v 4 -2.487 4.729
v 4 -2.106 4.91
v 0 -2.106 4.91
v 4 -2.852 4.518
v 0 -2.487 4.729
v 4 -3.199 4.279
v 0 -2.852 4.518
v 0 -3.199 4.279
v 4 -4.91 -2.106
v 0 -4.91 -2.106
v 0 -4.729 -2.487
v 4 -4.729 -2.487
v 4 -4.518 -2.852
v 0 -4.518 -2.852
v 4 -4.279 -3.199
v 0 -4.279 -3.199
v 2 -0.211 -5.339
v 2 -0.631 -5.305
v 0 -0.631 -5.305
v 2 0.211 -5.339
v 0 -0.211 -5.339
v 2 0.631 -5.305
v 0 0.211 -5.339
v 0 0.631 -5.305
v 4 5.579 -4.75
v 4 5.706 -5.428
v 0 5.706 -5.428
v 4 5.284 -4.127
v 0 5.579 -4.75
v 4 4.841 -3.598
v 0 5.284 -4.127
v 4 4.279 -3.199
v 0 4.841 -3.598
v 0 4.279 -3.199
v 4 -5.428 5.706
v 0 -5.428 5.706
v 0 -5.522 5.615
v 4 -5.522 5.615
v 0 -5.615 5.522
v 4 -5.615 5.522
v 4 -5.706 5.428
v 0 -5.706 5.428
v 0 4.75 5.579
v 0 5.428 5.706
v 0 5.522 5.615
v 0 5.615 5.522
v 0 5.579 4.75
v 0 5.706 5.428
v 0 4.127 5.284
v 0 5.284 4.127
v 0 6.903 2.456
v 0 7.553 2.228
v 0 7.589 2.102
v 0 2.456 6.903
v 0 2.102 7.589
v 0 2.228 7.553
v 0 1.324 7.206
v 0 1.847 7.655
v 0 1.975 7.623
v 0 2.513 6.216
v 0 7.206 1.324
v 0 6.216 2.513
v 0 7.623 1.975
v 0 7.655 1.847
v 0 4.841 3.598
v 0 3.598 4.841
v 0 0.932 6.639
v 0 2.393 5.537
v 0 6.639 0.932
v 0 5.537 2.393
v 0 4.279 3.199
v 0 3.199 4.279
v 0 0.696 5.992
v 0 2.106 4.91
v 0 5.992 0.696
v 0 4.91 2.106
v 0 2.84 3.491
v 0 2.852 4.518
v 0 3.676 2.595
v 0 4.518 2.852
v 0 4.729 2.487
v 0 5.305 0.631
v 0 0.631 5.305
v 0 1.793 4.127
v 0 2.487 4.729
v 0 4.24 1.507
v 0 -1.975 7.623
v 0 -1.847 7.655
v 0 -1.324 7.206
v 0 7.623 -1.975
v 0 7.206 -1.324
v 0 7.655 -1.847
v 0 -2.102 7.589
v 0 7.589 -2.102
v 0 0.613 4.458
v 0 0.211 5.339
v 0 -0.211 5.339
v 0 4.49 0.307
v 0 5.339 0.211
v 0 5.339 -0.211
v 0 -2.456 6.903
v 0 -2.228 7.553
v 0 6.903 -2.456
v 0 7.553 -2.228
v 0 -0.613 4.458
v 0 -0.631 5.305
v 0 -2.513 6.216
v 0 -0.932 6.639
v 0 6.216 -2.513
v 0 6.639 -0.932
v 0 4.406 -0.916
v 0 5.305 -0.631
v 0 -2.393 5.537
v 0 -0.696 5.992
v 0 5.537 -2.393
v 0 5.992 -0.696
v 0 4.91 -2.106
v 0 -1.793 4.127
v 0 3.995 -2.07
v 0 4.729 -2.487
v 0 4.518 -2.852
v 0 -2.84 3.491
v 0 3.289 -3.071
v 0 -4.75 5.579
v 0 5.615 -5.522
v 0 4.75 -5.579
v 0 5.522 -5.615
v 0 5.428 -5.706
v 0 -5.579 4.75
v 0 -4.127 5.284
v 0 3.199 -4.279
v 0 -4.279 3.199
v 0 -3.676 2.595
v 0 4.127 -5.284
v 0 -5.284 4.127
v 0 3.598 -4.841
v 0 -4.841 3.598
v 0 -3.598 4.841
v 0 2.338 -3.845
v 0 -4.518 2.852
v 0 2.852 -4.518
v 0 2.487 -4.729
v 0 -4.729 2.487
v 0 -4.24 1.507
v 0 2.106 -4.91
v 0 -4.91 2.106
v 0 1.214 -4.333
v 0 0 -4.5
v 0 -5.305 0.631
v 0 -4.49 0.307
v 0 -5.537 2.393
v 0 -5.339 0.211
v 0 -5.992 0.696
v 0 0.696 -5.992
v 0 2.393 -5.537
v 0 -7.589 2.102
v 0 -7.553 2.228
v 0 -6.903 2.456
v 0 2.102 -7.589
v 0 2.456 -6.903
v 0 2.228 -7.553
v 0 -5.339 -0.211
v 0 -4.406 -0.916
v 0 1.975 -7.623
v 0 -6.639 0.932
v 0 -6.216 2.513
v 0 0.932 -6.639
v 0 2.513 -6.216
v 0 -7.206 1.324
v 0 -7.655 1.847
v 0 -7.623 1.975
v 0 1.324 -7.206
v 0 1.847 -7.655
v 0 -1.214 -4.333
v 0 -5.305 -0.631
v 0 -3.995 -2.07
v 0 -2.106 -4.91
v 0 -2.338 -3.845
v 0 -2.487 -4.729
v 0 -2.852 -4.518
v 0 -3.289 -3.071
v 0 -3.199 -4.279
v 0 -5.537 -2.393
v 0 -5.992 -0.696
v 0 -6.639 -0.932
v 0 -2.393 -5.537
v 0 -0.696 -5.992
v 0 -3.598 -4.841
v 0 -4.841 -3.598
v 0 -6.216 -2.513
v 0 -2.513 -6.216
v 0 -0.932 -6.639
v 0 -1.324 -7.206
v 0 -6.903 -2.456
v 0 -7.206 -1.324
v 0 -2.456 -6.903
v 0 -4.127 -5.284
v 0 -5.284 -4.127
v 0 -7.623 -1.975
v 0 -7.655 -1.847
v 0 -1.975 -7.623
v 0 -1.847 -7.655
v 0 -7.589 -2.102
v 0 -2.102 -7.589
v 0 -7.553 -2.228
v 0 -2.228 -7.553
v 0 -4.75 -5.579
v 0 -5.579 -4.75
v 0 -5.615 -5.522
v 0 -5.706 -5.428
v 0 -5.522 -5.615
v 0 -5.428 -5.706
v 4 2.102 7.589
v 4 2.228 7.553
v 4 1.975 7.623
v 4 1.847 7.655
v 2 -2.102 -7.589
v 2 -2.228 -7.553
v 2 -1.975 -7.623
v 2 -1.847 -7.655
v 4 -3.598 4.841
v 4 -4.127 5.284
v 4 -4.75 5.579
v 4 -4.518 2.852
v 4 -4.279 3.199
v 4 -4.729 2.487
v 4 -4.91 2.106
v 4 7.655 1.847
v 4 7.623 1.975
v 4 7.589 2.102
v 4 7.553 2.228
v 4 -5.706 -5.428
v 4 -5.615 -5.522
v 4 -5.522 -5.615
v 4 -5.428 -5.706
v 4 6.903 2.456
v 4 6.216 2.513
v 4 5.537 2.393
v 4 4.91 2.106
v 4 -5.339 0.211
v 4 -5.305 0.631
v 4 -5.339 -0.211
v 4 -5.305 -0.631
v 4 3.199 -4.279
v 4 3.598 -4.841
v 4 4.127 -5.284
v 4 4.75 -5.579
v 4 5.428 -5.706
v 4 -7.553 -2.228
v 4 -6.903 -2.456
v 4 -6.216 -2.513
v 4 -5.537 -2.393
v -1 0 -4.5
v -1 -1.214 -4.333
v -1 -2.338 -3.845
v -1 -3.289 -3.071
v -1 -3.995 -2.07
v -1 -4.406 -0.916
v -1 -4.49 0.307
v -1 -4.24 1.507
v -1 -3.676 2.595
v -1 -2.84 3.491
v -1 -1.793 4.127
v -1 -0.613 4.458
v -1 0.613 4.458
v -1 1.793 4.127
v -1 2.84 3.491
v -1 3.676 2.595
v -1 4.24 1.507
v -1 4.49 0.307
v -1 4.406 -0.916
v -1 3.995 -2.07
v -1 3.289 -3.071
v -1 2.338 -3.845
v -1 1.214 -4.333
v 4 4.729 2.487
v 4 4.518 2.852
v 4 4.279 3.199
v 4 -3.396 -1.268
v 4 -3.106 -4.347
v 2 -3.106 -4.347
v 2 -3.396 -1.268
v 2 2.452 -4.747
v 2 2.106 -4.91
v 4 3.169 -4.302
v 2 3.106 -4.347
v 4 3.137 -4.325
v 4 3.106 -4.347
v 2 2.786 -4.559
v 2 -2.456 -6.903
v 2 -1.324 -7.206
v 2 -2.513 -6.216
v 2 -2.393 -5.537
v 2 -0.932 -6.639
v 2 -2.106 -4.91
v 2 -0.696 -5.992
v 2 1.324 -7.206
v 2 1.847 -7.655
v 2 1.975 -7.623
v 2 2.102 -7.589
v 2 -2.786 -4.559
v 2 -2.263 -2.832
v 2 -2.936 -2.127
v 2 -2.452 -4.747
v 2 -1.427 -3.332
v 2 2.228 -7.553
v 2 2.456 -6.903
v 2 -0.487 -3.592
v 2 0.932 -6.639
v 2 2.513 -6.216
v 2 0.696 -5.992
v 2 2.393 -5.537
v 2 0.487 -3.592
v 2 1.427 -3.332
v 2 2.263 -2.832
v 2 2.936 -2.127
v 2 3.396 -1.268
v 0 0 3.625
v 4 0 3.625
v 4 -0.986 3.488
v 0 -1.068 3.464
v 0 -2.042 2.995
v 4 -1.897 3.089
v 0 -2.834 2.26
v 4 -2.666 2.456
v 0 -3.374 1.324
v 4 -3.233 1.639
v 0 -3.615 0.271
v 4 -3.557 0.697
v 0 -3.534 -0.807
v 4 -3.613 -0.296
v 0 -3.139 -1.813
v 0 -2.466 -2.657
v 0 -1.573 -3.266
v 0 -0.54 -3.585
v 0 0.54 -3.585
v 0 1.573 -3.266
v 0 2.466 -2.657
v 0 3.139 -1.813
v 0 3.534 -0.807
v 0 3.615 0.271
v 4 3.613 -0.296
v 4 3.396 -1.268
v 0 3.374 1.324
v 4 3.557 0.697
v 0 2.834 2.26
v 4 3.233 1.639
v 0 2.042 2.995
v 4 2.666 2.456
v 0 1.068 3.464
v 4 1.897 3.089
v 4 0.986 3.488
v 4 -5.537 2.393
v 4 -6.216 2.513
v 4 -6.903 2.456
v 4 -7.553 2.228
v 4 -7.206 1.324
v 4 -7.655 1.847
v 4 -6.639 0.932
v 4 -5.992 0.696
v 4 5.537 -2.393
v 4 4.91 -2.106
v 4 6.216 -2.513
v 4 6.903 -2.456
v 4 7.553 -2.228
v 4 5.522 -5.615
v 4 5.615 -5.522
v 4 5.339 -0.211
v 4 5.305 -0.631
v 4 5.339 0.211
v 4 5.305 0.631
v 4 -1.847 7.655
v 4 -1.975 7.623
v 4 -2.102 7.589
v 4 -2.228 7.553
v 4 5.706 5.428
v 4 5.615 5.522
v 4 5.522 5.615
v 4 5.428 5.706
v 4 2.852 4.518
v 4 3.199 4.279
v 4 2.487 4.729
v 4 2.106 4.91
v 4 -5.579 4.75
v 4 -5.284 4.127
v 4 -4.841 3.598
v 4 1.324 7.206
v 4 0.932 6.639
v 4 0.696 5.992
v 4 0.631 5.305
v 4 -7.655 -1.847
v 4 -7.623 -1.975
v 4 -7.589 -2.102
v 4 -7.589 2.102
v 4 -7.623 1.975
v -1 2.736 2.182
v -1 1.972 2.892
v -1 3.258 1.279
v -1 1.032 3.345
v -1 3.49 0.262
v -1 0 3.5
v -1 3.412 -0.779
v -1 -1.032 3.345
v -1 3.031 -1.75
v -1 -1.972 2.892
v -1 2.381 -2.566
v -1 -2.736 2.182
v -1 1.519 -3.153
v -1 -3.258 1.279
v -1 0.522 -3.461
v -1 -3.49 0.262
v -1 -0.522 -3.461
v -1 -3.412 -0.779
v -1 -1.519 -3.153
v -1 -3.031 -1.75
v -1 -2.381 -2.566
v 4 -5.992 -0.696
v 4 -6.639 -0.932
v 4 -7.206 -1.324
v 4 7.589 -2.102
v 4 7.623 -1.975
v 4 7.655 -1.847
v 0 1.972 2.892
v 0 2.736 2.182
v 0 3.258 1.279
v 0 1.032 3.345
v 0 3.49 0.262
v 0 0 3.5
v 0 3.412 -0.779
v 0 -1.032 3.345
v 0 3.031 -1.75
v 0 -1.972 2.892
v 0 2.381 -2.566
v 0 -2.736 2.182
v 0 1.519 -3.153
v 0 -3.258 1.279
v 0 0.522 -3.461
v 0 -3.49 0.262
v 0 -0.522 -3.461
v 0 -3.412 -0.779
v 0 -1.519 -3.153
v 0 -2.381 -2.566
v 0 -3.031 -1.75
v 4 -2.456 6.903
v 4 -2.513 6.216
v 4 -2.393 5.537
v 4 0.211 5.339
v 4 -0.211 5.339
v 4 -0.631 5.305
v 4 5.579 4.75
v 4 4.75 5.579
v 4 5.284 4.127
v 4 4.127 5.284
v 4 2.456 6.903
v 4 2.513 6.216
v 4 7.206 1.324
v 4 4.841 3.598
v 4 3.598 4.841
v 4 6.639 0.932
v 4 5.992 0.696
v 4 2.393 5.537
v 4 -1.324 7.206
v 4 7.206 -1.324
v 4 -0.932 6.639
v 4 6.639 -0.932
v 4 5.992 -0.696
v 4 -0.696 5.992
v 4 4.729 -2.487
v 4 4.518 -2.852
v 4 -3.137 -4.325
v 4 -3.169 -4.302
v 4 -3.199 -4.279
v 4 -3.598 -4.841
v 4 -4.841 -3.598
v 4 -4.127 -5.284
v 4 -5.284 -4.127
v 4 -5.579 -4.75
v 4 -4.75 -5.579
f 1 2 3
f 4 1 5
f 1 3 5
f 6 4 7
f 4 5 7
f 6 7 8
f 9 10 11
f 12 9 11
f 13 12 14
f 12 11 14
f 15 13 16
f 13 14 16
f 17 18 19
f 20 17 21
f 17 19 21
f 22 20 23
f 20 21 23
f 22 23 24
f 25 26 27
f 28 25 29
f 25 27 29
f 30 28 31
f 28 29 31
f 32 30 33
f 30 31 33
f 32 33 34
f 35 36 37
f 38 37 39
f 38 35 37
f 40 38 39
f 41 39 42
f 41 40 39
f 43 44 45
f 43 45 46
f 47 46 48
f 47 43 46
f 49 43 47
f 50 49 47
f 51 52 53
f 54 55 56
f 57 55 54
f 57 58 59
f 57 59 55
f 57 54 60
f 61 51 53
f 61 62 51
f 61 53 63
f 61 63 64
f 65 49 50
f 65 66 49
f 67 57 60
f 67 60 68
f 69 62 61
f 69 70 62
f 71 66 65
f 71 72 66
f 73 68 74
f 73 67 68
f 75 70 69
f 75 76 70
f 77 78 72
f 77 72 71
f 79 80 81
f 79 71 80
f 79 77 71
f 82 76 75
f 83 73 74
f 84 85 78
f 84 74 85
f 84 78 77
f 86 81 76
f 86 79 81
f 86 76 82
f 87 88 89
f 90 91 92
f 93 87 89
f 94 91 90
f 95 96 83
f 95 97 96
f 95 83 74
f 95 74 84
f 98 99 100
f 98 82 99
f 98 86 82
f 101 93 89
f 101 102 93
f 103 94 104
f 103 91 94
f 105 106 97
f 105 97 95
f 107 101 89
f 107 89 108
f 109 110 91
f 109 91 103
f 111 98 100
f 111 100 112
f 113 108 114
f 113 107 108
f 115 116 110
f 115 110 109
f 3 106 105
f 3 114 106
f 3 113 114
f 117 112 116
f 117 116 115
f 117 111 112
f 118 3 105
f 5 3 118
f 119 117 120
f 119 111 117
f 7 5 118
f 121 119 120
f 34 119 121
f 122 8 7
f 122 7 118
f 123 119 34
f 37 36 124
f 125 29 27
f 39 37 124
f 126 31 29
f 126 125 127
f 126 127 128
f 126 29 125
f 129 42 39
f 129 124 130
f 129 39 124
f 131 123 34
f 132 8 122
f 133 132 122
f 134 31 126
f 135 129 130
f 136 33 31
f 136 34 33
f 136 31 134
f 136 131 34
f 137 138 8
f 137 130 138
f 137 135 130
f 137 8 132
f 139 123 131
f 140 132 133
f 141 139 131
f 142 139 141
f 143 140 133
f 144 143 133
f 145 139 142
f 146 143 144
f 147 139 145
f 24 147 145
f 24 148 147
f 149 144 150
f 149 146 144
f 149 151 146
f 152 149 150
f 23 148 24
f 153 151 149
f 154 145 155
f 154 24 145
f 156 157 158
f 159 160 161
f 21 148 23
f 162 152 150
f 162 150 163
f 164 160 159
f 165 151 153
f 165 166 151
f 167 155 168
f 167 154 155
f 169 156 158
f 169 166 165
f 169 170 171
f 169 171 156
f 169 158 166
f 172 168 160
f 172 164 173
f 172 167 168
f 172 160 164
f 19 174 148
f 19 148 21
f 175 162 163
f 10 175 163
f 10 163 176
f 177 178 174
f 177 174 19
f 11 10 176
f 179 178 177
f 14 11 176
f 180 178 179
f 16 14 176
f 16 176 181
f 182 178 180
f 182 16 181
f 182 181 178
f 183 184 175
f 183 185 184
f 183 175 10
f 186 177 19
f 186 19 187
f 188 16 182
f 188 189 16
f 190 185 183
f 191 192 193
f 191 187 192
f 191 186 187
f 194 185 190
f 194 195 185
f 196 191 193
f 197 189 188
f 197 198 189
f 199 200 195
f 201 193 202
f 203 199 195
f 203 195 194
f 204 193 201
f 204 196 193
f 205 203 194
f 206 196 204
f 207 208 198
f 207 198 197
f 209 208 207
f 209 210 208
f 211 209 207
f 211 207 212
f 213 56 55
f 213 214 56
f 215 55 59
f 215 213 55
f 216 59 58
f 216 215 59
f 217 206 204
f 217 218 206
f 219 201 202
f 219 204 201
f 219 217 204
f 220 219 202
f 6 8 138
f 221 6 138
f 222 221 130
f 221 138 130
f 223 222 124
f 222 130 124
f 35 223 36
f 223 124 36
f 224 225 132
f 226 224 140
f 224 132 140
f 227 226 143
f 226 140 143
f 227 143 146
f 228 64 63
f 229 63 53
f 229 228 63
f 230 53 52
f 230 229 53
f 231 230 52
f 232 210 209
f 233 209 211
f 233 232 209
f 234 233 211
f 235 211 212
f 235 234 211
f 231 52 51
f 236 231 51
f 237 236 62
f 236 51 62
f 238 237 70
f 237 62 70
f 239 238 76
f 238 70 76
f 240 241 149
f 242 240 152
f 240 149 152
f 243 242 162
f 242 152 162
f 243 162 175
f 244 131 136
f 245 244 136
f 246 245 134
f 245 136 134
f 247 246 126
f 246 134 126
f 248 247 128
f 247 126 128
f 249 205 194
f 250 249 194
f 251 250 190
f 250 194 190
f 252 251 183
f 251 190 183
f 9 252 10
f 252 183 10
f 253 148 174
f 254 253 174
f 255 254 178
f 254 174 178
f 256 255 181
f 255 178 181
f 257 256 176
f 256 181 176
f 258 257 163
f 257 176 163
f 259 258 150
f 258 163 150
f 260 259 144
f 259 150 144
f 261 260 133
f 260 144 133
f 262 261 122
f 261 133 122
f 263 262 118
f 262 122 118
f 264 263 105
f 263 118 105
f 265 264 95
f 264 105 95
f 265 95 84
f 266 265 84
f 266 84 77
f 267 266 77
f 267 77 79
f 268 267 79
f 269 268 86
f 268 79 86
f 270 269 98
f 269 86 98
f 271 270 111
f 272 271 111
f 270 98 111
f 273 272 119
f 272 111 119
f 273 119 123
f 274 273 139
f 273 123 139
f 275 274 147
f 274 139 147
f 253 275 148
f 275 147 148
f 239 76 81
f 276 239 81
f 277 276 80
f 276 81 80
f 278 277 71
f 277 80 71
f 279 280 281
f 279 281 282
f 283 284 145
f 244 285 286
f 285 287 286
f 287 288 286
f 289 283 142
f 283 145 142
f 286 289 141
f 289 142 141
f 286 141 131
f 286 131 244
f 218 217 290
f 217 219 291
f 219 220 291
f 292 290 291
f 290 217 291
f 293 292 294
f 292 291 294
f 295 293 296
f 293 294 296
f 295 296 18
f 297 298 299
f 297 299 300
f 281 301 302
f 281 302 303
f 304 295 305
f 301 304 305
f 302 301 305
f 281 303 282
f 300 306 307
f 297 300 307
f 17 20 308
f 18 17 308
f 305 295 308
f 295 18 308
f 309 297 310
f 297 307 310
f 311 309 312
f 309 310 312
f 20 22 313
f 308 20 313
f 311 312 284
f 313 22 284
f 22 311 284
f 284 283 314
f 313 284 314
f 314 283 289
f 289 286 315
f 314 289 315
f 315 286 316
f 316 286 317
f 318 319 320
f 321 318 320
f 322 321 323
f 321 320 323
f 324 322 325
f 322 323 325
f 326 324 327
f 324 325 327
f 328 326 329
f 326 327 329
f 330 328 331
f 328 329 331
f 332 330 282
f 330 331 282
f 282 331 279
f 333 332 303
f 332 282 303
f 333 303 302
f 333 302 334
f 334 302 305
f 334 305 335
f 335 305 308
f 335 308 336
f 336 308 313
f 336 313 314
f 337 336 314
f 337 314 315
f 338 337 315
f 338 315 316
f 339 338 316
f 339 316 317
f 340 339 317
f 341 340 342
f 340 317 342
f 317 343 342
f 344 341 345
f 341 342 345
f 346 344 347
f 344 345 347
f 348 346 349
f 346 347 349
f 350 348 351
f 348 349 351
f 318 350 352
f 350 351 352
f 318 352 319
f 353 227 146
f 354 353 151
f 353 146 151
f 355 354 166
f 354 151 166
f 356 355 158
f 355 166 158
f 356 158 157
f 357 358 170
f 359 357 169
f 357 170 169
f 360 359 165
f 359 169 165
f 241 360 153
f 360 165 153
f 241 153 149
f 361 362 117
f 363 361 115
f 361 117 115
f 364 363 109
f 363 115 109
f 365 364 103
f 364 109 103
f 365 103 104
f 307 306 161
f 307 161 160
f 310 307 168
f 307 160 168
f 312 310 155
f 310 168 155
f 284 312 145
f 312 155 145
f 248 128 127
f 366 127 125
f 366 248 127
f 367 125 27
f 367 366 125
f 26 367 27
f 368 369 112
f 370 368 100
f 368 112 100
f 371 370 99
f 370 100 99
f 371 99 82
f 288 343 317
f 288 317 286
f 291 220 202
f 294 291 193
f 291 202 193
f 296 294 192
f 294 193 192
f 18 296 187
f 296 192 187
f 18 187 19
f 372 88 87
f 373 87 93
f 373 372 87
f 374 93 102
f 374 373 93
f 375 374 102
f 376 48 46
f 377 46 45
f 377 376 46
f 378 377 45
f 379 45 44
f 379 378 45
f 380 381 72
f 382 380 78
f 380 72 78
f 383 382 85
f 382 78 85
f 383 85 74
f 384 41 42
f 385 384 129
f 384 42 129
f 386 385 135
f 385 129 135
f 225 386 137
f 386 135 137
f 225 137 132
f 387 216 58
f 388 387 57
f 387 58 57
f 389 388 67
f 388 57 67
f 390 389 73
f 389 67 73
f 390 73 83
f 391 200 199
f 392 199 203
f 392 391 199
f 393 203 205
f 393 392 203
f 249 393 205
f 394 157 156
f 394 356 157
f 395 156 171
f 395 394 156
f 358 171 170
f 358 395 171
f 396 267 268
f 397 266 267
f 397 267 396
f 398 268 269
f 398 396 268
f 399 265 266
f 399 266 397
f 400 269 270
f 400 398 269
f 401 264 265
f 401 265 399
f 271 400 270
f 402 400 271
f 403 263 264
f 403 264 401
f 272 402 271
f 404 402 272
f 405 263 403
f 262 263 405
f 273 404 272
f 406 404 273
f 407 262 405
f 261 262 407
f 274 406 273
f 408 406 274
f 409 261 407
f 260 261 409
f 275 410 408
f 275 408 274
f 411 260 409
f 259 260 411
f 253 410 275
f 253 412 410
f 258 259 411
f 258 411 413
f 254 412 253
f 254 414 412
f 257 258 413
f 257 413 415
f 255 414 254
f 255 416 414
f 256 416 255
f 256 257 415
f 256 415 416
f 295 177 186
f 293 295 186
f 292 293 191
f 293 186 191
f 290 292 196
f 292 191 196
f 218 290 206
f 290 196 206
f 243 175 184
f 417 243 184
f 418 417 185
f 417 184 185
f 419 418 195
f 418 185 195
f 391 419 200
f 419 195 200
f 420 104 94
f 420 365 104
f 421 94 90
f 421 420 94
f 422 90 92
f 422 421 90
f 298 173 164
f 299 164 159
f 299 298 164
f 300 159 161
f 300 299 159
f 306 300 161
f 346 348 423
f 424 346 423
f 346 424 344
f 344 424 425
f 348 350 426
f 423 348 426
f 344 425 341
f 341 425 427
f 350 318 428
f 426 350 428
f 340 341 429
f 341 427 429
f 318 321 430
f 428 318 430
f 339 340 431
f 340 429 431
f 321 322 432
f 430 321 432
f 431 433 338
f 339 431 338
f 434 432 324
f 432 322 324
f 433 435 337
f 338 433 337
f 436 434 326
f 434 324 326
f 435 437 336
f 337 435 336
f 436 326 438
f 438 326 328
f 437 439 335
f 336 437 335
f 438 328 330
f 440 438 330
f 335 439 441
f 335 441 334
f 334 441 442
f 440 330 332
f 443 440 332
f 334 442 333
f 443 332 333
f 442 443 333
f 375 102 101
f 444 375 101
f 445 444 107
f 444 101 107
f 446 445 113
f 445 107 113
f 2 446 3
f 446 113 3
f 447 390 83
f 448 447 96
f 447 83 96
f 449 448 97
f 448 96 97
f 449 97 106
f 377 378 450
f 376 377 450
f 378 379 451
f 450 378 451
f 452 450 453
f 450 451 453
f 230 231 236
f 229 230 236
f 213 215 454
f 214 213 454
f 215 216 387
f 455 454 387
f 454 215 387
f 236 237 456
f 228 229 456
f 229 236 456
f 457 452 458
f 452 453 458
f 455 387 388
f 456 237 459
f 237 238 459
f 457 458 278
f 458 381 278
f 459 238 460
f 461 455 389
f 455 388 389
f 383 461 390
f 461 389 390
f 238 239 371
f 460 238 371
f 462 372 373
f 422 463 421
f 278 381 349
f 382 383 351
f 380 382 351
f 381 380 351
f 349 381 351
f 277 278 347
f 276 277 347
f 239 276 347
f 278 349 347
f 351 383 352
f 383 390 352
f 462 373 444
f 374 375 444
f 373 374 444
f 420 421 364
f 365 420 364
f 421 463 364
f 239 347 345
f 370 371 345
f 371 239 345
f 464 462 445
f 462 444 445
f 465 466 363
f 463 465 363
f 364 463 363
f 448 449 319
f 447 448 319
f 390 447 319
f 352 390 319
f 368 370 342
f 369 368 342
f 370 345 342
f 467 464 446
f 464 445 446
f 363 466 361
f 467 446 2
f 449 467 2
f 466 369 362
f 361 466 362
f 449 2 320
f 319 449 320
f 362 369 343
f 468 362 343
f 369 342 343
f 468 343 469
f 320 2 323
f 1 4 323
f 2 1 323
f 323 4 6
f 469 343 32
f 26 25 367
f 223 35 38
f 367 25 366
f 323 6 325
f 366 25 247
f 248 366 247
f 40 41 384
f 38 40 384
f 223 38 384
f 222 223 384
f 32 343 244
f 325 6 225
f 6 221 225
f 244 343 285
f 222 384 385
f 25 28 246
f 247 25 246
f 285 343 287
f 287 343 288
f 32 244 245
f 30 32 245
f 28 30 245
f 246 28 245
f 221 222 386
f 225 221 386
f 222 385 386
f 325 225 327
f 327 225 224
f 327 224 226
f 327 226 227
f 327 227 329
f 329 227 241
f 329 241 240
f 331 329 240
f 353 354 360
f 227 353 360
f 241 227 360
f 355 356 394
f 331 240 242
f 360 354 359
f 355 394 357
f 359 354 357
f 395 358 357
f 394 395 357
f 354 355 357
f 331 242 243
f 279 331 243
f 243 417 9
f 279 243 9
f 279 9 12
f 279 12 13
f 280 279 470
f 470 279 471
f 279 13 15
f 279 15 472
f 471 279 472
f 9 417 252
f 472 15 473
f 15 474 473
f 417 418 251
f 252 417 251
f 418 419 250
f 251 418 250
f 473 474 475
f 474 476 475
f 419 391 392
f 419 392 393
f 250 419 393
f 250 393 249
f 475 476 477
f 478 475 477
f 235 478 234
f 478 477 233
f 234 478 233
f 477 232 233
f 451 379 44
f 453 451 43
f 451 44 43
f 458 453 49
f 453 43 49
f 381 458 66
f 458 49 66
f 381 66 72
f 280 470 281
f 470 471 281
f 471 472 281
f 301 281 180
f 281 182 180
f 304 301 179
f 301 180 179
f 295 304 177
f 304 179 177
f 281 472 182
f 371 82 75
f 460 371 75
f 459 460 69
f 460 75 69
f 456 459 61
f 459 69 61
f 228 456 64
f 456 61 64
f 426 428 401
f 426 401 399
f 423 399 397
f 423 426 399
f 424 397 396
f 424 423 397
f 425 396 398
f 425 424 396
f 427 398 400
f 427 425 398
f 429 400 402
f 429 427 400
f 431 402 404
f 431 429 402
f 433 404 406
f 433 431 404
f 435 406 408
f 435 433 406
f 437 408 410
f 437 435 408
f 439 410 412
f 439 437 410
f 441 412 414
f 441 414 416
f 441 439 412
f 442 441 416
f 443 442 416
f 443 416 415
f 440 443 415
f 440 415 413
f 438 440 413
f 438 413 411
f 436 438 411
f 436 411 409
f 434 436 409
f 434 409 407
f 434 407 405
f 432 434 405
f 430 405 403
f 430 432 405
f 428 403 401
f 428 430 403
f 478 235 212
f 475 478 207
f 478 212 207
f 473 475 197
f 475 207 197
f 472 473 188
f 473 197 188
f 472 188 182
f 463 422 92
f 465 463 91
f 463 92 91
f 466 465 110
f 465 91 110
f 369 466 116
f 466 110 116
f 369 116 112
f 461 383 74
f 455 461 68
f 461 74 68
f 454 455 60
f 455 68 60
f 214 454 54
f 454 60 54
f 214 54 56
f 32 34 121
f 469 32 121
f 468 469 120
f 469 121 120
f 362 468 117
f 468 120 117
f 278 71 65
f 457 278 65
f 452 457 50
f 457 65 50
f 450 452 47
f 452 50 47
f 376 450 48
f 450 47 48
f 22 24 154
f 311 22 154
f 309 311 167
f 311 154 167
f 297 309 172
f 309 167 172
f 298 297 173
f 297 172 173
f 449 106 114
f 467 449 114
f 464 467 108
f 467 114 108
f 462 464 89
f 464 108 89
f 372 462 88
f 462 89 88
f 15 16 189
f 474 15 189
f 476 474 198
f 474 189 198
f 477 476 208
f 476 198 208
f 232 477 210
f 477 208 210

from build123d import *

# Parameters (mm, degrees)
BASPROSKE_W         = 4
BASPROSKE_H         = 7.875
TOOTHCUT_DEPTH      = 12.833480046
TEETHCUTS_COUNT     = 12
TEETHCUTS_ANGLE     = 330
BORSKE_R            = 3.625
BORE_DEPTH          = 50.0000508
SKETCH1_R           = 4.5
SKETCH1_R_2         = 3.5
BOSS_EXTRUDE1_DEPTH = 1
CUT_EXTRUDE2_DEPTH  = 2


with BuildPart() as part:
    # BasProSke → Base-Revolve (revolve)
    with BuildSketch(Plane(origin=(0, 0, 0), x_dir=(1, 0, 0), z_dir=(0, 1, 0)), mode=Mode.PRIVATE) as base_revolve_sk:
        with Locations((2, 3.9375)):
            Rectangle(BASPROSKE_W, BASPROSKE_H)
    revolve(base_revolve_sk.sketch.rotate(Axis((-10, 0, 0), (1, 0, 0)), 180), axis=Axis((-10, 0, 0), (1, 0, 0)))

    # TooCutSke → ToothCut (cut, through all)
    with BuildSketch(Plane(origin=(0, 0, 0), x_dir=(0, 0, -1), z_dir=(1, 0, 0))):
        with BuildLine():
            ThreePointArc((0.631439839, 5.305305014), (0, 5.34275), (-0.631439839, 5.305305014))
            ThreePointArc((-0.631439839, 5.305305014), (-0.93992237, 6.654932089), (-1.876748184, 7.674251521))
            ThreePointArc((-1.876748184, 7.674251521), (0, 7.9004), (1.876748184, 7.674251521))
            ThreePointArc((1.876748184, 7.674251521), (0.93992237, 6.654932089), (0.631439839, 5.305305014))
        make_face()
    toothcut = extrude(amount=TOOTHCUT_DEPTH, mode=Mode.SUBTRACT)

    # TeethCuts: ToothCut ×12 about axis
    teethcuts_axis = Axis((-10, 0, 0), (1, 0, 0))
    for i in range(1, TEETHCUTS_COUNT):
        add(toothcut.rotate(teethcuts_axis, i * TEETHCUTS_ANGLE / (TEETHCUTS_COUNT - 1)), mode=Mode.SUBTRACT)

    # BorSke → Bore (cut, symmetric)
    with BuildSketch(Plane(origin=(0, 0, 0), x_dir=(0, 0, -1), z_dir=(1, 0, 0))):
        with Locations(Location((0, 0, 0), (0, 0, 180))):
            Circle(BORSKE_R)
    extrude(amount=BORE_DEPTH, both=True, mode=Mode.SUBTRACT)

    # Sketch1 → Boss-Extrude1 (add)
    with BuildSketch(Plane.ZY):
        with Locations(Location((0, 0, 0), (0, 0, 180))):
            Circle(SKETCH1_R)
        Circle(SKETCH1_R_2, mode=Mode.SUBTRACT)
    extrude(amount=BOSS_EXTRUDE1_DEPTH)

    # Sketch3 → Cut-Extrude2 (cut)
    with BuildSketch(Plane(origin=(4, 0, 0), x_dir=(0, 0, -1), z_dir=(1, 0, 0))):
        with BuildLine():
            Line((0.328125, 3.484585195), (16.1875, 1.99119154))
            ThreePointArc((16.1875, 1.99119154), (18, 0), (16.1875, -1.99119154))
            Line((16.1875, -1.99119154), (0.328125, -3.484585195))
            ThreePointArc((0.328125, -3.484585195), (-3.5, 0), (0.328125, 3.484585195))
        make_face()
    extrude(amount=-CUT_EXTRUDE2_DEPTH, mode=Mode.SUBTRACT)


solid = part.part
